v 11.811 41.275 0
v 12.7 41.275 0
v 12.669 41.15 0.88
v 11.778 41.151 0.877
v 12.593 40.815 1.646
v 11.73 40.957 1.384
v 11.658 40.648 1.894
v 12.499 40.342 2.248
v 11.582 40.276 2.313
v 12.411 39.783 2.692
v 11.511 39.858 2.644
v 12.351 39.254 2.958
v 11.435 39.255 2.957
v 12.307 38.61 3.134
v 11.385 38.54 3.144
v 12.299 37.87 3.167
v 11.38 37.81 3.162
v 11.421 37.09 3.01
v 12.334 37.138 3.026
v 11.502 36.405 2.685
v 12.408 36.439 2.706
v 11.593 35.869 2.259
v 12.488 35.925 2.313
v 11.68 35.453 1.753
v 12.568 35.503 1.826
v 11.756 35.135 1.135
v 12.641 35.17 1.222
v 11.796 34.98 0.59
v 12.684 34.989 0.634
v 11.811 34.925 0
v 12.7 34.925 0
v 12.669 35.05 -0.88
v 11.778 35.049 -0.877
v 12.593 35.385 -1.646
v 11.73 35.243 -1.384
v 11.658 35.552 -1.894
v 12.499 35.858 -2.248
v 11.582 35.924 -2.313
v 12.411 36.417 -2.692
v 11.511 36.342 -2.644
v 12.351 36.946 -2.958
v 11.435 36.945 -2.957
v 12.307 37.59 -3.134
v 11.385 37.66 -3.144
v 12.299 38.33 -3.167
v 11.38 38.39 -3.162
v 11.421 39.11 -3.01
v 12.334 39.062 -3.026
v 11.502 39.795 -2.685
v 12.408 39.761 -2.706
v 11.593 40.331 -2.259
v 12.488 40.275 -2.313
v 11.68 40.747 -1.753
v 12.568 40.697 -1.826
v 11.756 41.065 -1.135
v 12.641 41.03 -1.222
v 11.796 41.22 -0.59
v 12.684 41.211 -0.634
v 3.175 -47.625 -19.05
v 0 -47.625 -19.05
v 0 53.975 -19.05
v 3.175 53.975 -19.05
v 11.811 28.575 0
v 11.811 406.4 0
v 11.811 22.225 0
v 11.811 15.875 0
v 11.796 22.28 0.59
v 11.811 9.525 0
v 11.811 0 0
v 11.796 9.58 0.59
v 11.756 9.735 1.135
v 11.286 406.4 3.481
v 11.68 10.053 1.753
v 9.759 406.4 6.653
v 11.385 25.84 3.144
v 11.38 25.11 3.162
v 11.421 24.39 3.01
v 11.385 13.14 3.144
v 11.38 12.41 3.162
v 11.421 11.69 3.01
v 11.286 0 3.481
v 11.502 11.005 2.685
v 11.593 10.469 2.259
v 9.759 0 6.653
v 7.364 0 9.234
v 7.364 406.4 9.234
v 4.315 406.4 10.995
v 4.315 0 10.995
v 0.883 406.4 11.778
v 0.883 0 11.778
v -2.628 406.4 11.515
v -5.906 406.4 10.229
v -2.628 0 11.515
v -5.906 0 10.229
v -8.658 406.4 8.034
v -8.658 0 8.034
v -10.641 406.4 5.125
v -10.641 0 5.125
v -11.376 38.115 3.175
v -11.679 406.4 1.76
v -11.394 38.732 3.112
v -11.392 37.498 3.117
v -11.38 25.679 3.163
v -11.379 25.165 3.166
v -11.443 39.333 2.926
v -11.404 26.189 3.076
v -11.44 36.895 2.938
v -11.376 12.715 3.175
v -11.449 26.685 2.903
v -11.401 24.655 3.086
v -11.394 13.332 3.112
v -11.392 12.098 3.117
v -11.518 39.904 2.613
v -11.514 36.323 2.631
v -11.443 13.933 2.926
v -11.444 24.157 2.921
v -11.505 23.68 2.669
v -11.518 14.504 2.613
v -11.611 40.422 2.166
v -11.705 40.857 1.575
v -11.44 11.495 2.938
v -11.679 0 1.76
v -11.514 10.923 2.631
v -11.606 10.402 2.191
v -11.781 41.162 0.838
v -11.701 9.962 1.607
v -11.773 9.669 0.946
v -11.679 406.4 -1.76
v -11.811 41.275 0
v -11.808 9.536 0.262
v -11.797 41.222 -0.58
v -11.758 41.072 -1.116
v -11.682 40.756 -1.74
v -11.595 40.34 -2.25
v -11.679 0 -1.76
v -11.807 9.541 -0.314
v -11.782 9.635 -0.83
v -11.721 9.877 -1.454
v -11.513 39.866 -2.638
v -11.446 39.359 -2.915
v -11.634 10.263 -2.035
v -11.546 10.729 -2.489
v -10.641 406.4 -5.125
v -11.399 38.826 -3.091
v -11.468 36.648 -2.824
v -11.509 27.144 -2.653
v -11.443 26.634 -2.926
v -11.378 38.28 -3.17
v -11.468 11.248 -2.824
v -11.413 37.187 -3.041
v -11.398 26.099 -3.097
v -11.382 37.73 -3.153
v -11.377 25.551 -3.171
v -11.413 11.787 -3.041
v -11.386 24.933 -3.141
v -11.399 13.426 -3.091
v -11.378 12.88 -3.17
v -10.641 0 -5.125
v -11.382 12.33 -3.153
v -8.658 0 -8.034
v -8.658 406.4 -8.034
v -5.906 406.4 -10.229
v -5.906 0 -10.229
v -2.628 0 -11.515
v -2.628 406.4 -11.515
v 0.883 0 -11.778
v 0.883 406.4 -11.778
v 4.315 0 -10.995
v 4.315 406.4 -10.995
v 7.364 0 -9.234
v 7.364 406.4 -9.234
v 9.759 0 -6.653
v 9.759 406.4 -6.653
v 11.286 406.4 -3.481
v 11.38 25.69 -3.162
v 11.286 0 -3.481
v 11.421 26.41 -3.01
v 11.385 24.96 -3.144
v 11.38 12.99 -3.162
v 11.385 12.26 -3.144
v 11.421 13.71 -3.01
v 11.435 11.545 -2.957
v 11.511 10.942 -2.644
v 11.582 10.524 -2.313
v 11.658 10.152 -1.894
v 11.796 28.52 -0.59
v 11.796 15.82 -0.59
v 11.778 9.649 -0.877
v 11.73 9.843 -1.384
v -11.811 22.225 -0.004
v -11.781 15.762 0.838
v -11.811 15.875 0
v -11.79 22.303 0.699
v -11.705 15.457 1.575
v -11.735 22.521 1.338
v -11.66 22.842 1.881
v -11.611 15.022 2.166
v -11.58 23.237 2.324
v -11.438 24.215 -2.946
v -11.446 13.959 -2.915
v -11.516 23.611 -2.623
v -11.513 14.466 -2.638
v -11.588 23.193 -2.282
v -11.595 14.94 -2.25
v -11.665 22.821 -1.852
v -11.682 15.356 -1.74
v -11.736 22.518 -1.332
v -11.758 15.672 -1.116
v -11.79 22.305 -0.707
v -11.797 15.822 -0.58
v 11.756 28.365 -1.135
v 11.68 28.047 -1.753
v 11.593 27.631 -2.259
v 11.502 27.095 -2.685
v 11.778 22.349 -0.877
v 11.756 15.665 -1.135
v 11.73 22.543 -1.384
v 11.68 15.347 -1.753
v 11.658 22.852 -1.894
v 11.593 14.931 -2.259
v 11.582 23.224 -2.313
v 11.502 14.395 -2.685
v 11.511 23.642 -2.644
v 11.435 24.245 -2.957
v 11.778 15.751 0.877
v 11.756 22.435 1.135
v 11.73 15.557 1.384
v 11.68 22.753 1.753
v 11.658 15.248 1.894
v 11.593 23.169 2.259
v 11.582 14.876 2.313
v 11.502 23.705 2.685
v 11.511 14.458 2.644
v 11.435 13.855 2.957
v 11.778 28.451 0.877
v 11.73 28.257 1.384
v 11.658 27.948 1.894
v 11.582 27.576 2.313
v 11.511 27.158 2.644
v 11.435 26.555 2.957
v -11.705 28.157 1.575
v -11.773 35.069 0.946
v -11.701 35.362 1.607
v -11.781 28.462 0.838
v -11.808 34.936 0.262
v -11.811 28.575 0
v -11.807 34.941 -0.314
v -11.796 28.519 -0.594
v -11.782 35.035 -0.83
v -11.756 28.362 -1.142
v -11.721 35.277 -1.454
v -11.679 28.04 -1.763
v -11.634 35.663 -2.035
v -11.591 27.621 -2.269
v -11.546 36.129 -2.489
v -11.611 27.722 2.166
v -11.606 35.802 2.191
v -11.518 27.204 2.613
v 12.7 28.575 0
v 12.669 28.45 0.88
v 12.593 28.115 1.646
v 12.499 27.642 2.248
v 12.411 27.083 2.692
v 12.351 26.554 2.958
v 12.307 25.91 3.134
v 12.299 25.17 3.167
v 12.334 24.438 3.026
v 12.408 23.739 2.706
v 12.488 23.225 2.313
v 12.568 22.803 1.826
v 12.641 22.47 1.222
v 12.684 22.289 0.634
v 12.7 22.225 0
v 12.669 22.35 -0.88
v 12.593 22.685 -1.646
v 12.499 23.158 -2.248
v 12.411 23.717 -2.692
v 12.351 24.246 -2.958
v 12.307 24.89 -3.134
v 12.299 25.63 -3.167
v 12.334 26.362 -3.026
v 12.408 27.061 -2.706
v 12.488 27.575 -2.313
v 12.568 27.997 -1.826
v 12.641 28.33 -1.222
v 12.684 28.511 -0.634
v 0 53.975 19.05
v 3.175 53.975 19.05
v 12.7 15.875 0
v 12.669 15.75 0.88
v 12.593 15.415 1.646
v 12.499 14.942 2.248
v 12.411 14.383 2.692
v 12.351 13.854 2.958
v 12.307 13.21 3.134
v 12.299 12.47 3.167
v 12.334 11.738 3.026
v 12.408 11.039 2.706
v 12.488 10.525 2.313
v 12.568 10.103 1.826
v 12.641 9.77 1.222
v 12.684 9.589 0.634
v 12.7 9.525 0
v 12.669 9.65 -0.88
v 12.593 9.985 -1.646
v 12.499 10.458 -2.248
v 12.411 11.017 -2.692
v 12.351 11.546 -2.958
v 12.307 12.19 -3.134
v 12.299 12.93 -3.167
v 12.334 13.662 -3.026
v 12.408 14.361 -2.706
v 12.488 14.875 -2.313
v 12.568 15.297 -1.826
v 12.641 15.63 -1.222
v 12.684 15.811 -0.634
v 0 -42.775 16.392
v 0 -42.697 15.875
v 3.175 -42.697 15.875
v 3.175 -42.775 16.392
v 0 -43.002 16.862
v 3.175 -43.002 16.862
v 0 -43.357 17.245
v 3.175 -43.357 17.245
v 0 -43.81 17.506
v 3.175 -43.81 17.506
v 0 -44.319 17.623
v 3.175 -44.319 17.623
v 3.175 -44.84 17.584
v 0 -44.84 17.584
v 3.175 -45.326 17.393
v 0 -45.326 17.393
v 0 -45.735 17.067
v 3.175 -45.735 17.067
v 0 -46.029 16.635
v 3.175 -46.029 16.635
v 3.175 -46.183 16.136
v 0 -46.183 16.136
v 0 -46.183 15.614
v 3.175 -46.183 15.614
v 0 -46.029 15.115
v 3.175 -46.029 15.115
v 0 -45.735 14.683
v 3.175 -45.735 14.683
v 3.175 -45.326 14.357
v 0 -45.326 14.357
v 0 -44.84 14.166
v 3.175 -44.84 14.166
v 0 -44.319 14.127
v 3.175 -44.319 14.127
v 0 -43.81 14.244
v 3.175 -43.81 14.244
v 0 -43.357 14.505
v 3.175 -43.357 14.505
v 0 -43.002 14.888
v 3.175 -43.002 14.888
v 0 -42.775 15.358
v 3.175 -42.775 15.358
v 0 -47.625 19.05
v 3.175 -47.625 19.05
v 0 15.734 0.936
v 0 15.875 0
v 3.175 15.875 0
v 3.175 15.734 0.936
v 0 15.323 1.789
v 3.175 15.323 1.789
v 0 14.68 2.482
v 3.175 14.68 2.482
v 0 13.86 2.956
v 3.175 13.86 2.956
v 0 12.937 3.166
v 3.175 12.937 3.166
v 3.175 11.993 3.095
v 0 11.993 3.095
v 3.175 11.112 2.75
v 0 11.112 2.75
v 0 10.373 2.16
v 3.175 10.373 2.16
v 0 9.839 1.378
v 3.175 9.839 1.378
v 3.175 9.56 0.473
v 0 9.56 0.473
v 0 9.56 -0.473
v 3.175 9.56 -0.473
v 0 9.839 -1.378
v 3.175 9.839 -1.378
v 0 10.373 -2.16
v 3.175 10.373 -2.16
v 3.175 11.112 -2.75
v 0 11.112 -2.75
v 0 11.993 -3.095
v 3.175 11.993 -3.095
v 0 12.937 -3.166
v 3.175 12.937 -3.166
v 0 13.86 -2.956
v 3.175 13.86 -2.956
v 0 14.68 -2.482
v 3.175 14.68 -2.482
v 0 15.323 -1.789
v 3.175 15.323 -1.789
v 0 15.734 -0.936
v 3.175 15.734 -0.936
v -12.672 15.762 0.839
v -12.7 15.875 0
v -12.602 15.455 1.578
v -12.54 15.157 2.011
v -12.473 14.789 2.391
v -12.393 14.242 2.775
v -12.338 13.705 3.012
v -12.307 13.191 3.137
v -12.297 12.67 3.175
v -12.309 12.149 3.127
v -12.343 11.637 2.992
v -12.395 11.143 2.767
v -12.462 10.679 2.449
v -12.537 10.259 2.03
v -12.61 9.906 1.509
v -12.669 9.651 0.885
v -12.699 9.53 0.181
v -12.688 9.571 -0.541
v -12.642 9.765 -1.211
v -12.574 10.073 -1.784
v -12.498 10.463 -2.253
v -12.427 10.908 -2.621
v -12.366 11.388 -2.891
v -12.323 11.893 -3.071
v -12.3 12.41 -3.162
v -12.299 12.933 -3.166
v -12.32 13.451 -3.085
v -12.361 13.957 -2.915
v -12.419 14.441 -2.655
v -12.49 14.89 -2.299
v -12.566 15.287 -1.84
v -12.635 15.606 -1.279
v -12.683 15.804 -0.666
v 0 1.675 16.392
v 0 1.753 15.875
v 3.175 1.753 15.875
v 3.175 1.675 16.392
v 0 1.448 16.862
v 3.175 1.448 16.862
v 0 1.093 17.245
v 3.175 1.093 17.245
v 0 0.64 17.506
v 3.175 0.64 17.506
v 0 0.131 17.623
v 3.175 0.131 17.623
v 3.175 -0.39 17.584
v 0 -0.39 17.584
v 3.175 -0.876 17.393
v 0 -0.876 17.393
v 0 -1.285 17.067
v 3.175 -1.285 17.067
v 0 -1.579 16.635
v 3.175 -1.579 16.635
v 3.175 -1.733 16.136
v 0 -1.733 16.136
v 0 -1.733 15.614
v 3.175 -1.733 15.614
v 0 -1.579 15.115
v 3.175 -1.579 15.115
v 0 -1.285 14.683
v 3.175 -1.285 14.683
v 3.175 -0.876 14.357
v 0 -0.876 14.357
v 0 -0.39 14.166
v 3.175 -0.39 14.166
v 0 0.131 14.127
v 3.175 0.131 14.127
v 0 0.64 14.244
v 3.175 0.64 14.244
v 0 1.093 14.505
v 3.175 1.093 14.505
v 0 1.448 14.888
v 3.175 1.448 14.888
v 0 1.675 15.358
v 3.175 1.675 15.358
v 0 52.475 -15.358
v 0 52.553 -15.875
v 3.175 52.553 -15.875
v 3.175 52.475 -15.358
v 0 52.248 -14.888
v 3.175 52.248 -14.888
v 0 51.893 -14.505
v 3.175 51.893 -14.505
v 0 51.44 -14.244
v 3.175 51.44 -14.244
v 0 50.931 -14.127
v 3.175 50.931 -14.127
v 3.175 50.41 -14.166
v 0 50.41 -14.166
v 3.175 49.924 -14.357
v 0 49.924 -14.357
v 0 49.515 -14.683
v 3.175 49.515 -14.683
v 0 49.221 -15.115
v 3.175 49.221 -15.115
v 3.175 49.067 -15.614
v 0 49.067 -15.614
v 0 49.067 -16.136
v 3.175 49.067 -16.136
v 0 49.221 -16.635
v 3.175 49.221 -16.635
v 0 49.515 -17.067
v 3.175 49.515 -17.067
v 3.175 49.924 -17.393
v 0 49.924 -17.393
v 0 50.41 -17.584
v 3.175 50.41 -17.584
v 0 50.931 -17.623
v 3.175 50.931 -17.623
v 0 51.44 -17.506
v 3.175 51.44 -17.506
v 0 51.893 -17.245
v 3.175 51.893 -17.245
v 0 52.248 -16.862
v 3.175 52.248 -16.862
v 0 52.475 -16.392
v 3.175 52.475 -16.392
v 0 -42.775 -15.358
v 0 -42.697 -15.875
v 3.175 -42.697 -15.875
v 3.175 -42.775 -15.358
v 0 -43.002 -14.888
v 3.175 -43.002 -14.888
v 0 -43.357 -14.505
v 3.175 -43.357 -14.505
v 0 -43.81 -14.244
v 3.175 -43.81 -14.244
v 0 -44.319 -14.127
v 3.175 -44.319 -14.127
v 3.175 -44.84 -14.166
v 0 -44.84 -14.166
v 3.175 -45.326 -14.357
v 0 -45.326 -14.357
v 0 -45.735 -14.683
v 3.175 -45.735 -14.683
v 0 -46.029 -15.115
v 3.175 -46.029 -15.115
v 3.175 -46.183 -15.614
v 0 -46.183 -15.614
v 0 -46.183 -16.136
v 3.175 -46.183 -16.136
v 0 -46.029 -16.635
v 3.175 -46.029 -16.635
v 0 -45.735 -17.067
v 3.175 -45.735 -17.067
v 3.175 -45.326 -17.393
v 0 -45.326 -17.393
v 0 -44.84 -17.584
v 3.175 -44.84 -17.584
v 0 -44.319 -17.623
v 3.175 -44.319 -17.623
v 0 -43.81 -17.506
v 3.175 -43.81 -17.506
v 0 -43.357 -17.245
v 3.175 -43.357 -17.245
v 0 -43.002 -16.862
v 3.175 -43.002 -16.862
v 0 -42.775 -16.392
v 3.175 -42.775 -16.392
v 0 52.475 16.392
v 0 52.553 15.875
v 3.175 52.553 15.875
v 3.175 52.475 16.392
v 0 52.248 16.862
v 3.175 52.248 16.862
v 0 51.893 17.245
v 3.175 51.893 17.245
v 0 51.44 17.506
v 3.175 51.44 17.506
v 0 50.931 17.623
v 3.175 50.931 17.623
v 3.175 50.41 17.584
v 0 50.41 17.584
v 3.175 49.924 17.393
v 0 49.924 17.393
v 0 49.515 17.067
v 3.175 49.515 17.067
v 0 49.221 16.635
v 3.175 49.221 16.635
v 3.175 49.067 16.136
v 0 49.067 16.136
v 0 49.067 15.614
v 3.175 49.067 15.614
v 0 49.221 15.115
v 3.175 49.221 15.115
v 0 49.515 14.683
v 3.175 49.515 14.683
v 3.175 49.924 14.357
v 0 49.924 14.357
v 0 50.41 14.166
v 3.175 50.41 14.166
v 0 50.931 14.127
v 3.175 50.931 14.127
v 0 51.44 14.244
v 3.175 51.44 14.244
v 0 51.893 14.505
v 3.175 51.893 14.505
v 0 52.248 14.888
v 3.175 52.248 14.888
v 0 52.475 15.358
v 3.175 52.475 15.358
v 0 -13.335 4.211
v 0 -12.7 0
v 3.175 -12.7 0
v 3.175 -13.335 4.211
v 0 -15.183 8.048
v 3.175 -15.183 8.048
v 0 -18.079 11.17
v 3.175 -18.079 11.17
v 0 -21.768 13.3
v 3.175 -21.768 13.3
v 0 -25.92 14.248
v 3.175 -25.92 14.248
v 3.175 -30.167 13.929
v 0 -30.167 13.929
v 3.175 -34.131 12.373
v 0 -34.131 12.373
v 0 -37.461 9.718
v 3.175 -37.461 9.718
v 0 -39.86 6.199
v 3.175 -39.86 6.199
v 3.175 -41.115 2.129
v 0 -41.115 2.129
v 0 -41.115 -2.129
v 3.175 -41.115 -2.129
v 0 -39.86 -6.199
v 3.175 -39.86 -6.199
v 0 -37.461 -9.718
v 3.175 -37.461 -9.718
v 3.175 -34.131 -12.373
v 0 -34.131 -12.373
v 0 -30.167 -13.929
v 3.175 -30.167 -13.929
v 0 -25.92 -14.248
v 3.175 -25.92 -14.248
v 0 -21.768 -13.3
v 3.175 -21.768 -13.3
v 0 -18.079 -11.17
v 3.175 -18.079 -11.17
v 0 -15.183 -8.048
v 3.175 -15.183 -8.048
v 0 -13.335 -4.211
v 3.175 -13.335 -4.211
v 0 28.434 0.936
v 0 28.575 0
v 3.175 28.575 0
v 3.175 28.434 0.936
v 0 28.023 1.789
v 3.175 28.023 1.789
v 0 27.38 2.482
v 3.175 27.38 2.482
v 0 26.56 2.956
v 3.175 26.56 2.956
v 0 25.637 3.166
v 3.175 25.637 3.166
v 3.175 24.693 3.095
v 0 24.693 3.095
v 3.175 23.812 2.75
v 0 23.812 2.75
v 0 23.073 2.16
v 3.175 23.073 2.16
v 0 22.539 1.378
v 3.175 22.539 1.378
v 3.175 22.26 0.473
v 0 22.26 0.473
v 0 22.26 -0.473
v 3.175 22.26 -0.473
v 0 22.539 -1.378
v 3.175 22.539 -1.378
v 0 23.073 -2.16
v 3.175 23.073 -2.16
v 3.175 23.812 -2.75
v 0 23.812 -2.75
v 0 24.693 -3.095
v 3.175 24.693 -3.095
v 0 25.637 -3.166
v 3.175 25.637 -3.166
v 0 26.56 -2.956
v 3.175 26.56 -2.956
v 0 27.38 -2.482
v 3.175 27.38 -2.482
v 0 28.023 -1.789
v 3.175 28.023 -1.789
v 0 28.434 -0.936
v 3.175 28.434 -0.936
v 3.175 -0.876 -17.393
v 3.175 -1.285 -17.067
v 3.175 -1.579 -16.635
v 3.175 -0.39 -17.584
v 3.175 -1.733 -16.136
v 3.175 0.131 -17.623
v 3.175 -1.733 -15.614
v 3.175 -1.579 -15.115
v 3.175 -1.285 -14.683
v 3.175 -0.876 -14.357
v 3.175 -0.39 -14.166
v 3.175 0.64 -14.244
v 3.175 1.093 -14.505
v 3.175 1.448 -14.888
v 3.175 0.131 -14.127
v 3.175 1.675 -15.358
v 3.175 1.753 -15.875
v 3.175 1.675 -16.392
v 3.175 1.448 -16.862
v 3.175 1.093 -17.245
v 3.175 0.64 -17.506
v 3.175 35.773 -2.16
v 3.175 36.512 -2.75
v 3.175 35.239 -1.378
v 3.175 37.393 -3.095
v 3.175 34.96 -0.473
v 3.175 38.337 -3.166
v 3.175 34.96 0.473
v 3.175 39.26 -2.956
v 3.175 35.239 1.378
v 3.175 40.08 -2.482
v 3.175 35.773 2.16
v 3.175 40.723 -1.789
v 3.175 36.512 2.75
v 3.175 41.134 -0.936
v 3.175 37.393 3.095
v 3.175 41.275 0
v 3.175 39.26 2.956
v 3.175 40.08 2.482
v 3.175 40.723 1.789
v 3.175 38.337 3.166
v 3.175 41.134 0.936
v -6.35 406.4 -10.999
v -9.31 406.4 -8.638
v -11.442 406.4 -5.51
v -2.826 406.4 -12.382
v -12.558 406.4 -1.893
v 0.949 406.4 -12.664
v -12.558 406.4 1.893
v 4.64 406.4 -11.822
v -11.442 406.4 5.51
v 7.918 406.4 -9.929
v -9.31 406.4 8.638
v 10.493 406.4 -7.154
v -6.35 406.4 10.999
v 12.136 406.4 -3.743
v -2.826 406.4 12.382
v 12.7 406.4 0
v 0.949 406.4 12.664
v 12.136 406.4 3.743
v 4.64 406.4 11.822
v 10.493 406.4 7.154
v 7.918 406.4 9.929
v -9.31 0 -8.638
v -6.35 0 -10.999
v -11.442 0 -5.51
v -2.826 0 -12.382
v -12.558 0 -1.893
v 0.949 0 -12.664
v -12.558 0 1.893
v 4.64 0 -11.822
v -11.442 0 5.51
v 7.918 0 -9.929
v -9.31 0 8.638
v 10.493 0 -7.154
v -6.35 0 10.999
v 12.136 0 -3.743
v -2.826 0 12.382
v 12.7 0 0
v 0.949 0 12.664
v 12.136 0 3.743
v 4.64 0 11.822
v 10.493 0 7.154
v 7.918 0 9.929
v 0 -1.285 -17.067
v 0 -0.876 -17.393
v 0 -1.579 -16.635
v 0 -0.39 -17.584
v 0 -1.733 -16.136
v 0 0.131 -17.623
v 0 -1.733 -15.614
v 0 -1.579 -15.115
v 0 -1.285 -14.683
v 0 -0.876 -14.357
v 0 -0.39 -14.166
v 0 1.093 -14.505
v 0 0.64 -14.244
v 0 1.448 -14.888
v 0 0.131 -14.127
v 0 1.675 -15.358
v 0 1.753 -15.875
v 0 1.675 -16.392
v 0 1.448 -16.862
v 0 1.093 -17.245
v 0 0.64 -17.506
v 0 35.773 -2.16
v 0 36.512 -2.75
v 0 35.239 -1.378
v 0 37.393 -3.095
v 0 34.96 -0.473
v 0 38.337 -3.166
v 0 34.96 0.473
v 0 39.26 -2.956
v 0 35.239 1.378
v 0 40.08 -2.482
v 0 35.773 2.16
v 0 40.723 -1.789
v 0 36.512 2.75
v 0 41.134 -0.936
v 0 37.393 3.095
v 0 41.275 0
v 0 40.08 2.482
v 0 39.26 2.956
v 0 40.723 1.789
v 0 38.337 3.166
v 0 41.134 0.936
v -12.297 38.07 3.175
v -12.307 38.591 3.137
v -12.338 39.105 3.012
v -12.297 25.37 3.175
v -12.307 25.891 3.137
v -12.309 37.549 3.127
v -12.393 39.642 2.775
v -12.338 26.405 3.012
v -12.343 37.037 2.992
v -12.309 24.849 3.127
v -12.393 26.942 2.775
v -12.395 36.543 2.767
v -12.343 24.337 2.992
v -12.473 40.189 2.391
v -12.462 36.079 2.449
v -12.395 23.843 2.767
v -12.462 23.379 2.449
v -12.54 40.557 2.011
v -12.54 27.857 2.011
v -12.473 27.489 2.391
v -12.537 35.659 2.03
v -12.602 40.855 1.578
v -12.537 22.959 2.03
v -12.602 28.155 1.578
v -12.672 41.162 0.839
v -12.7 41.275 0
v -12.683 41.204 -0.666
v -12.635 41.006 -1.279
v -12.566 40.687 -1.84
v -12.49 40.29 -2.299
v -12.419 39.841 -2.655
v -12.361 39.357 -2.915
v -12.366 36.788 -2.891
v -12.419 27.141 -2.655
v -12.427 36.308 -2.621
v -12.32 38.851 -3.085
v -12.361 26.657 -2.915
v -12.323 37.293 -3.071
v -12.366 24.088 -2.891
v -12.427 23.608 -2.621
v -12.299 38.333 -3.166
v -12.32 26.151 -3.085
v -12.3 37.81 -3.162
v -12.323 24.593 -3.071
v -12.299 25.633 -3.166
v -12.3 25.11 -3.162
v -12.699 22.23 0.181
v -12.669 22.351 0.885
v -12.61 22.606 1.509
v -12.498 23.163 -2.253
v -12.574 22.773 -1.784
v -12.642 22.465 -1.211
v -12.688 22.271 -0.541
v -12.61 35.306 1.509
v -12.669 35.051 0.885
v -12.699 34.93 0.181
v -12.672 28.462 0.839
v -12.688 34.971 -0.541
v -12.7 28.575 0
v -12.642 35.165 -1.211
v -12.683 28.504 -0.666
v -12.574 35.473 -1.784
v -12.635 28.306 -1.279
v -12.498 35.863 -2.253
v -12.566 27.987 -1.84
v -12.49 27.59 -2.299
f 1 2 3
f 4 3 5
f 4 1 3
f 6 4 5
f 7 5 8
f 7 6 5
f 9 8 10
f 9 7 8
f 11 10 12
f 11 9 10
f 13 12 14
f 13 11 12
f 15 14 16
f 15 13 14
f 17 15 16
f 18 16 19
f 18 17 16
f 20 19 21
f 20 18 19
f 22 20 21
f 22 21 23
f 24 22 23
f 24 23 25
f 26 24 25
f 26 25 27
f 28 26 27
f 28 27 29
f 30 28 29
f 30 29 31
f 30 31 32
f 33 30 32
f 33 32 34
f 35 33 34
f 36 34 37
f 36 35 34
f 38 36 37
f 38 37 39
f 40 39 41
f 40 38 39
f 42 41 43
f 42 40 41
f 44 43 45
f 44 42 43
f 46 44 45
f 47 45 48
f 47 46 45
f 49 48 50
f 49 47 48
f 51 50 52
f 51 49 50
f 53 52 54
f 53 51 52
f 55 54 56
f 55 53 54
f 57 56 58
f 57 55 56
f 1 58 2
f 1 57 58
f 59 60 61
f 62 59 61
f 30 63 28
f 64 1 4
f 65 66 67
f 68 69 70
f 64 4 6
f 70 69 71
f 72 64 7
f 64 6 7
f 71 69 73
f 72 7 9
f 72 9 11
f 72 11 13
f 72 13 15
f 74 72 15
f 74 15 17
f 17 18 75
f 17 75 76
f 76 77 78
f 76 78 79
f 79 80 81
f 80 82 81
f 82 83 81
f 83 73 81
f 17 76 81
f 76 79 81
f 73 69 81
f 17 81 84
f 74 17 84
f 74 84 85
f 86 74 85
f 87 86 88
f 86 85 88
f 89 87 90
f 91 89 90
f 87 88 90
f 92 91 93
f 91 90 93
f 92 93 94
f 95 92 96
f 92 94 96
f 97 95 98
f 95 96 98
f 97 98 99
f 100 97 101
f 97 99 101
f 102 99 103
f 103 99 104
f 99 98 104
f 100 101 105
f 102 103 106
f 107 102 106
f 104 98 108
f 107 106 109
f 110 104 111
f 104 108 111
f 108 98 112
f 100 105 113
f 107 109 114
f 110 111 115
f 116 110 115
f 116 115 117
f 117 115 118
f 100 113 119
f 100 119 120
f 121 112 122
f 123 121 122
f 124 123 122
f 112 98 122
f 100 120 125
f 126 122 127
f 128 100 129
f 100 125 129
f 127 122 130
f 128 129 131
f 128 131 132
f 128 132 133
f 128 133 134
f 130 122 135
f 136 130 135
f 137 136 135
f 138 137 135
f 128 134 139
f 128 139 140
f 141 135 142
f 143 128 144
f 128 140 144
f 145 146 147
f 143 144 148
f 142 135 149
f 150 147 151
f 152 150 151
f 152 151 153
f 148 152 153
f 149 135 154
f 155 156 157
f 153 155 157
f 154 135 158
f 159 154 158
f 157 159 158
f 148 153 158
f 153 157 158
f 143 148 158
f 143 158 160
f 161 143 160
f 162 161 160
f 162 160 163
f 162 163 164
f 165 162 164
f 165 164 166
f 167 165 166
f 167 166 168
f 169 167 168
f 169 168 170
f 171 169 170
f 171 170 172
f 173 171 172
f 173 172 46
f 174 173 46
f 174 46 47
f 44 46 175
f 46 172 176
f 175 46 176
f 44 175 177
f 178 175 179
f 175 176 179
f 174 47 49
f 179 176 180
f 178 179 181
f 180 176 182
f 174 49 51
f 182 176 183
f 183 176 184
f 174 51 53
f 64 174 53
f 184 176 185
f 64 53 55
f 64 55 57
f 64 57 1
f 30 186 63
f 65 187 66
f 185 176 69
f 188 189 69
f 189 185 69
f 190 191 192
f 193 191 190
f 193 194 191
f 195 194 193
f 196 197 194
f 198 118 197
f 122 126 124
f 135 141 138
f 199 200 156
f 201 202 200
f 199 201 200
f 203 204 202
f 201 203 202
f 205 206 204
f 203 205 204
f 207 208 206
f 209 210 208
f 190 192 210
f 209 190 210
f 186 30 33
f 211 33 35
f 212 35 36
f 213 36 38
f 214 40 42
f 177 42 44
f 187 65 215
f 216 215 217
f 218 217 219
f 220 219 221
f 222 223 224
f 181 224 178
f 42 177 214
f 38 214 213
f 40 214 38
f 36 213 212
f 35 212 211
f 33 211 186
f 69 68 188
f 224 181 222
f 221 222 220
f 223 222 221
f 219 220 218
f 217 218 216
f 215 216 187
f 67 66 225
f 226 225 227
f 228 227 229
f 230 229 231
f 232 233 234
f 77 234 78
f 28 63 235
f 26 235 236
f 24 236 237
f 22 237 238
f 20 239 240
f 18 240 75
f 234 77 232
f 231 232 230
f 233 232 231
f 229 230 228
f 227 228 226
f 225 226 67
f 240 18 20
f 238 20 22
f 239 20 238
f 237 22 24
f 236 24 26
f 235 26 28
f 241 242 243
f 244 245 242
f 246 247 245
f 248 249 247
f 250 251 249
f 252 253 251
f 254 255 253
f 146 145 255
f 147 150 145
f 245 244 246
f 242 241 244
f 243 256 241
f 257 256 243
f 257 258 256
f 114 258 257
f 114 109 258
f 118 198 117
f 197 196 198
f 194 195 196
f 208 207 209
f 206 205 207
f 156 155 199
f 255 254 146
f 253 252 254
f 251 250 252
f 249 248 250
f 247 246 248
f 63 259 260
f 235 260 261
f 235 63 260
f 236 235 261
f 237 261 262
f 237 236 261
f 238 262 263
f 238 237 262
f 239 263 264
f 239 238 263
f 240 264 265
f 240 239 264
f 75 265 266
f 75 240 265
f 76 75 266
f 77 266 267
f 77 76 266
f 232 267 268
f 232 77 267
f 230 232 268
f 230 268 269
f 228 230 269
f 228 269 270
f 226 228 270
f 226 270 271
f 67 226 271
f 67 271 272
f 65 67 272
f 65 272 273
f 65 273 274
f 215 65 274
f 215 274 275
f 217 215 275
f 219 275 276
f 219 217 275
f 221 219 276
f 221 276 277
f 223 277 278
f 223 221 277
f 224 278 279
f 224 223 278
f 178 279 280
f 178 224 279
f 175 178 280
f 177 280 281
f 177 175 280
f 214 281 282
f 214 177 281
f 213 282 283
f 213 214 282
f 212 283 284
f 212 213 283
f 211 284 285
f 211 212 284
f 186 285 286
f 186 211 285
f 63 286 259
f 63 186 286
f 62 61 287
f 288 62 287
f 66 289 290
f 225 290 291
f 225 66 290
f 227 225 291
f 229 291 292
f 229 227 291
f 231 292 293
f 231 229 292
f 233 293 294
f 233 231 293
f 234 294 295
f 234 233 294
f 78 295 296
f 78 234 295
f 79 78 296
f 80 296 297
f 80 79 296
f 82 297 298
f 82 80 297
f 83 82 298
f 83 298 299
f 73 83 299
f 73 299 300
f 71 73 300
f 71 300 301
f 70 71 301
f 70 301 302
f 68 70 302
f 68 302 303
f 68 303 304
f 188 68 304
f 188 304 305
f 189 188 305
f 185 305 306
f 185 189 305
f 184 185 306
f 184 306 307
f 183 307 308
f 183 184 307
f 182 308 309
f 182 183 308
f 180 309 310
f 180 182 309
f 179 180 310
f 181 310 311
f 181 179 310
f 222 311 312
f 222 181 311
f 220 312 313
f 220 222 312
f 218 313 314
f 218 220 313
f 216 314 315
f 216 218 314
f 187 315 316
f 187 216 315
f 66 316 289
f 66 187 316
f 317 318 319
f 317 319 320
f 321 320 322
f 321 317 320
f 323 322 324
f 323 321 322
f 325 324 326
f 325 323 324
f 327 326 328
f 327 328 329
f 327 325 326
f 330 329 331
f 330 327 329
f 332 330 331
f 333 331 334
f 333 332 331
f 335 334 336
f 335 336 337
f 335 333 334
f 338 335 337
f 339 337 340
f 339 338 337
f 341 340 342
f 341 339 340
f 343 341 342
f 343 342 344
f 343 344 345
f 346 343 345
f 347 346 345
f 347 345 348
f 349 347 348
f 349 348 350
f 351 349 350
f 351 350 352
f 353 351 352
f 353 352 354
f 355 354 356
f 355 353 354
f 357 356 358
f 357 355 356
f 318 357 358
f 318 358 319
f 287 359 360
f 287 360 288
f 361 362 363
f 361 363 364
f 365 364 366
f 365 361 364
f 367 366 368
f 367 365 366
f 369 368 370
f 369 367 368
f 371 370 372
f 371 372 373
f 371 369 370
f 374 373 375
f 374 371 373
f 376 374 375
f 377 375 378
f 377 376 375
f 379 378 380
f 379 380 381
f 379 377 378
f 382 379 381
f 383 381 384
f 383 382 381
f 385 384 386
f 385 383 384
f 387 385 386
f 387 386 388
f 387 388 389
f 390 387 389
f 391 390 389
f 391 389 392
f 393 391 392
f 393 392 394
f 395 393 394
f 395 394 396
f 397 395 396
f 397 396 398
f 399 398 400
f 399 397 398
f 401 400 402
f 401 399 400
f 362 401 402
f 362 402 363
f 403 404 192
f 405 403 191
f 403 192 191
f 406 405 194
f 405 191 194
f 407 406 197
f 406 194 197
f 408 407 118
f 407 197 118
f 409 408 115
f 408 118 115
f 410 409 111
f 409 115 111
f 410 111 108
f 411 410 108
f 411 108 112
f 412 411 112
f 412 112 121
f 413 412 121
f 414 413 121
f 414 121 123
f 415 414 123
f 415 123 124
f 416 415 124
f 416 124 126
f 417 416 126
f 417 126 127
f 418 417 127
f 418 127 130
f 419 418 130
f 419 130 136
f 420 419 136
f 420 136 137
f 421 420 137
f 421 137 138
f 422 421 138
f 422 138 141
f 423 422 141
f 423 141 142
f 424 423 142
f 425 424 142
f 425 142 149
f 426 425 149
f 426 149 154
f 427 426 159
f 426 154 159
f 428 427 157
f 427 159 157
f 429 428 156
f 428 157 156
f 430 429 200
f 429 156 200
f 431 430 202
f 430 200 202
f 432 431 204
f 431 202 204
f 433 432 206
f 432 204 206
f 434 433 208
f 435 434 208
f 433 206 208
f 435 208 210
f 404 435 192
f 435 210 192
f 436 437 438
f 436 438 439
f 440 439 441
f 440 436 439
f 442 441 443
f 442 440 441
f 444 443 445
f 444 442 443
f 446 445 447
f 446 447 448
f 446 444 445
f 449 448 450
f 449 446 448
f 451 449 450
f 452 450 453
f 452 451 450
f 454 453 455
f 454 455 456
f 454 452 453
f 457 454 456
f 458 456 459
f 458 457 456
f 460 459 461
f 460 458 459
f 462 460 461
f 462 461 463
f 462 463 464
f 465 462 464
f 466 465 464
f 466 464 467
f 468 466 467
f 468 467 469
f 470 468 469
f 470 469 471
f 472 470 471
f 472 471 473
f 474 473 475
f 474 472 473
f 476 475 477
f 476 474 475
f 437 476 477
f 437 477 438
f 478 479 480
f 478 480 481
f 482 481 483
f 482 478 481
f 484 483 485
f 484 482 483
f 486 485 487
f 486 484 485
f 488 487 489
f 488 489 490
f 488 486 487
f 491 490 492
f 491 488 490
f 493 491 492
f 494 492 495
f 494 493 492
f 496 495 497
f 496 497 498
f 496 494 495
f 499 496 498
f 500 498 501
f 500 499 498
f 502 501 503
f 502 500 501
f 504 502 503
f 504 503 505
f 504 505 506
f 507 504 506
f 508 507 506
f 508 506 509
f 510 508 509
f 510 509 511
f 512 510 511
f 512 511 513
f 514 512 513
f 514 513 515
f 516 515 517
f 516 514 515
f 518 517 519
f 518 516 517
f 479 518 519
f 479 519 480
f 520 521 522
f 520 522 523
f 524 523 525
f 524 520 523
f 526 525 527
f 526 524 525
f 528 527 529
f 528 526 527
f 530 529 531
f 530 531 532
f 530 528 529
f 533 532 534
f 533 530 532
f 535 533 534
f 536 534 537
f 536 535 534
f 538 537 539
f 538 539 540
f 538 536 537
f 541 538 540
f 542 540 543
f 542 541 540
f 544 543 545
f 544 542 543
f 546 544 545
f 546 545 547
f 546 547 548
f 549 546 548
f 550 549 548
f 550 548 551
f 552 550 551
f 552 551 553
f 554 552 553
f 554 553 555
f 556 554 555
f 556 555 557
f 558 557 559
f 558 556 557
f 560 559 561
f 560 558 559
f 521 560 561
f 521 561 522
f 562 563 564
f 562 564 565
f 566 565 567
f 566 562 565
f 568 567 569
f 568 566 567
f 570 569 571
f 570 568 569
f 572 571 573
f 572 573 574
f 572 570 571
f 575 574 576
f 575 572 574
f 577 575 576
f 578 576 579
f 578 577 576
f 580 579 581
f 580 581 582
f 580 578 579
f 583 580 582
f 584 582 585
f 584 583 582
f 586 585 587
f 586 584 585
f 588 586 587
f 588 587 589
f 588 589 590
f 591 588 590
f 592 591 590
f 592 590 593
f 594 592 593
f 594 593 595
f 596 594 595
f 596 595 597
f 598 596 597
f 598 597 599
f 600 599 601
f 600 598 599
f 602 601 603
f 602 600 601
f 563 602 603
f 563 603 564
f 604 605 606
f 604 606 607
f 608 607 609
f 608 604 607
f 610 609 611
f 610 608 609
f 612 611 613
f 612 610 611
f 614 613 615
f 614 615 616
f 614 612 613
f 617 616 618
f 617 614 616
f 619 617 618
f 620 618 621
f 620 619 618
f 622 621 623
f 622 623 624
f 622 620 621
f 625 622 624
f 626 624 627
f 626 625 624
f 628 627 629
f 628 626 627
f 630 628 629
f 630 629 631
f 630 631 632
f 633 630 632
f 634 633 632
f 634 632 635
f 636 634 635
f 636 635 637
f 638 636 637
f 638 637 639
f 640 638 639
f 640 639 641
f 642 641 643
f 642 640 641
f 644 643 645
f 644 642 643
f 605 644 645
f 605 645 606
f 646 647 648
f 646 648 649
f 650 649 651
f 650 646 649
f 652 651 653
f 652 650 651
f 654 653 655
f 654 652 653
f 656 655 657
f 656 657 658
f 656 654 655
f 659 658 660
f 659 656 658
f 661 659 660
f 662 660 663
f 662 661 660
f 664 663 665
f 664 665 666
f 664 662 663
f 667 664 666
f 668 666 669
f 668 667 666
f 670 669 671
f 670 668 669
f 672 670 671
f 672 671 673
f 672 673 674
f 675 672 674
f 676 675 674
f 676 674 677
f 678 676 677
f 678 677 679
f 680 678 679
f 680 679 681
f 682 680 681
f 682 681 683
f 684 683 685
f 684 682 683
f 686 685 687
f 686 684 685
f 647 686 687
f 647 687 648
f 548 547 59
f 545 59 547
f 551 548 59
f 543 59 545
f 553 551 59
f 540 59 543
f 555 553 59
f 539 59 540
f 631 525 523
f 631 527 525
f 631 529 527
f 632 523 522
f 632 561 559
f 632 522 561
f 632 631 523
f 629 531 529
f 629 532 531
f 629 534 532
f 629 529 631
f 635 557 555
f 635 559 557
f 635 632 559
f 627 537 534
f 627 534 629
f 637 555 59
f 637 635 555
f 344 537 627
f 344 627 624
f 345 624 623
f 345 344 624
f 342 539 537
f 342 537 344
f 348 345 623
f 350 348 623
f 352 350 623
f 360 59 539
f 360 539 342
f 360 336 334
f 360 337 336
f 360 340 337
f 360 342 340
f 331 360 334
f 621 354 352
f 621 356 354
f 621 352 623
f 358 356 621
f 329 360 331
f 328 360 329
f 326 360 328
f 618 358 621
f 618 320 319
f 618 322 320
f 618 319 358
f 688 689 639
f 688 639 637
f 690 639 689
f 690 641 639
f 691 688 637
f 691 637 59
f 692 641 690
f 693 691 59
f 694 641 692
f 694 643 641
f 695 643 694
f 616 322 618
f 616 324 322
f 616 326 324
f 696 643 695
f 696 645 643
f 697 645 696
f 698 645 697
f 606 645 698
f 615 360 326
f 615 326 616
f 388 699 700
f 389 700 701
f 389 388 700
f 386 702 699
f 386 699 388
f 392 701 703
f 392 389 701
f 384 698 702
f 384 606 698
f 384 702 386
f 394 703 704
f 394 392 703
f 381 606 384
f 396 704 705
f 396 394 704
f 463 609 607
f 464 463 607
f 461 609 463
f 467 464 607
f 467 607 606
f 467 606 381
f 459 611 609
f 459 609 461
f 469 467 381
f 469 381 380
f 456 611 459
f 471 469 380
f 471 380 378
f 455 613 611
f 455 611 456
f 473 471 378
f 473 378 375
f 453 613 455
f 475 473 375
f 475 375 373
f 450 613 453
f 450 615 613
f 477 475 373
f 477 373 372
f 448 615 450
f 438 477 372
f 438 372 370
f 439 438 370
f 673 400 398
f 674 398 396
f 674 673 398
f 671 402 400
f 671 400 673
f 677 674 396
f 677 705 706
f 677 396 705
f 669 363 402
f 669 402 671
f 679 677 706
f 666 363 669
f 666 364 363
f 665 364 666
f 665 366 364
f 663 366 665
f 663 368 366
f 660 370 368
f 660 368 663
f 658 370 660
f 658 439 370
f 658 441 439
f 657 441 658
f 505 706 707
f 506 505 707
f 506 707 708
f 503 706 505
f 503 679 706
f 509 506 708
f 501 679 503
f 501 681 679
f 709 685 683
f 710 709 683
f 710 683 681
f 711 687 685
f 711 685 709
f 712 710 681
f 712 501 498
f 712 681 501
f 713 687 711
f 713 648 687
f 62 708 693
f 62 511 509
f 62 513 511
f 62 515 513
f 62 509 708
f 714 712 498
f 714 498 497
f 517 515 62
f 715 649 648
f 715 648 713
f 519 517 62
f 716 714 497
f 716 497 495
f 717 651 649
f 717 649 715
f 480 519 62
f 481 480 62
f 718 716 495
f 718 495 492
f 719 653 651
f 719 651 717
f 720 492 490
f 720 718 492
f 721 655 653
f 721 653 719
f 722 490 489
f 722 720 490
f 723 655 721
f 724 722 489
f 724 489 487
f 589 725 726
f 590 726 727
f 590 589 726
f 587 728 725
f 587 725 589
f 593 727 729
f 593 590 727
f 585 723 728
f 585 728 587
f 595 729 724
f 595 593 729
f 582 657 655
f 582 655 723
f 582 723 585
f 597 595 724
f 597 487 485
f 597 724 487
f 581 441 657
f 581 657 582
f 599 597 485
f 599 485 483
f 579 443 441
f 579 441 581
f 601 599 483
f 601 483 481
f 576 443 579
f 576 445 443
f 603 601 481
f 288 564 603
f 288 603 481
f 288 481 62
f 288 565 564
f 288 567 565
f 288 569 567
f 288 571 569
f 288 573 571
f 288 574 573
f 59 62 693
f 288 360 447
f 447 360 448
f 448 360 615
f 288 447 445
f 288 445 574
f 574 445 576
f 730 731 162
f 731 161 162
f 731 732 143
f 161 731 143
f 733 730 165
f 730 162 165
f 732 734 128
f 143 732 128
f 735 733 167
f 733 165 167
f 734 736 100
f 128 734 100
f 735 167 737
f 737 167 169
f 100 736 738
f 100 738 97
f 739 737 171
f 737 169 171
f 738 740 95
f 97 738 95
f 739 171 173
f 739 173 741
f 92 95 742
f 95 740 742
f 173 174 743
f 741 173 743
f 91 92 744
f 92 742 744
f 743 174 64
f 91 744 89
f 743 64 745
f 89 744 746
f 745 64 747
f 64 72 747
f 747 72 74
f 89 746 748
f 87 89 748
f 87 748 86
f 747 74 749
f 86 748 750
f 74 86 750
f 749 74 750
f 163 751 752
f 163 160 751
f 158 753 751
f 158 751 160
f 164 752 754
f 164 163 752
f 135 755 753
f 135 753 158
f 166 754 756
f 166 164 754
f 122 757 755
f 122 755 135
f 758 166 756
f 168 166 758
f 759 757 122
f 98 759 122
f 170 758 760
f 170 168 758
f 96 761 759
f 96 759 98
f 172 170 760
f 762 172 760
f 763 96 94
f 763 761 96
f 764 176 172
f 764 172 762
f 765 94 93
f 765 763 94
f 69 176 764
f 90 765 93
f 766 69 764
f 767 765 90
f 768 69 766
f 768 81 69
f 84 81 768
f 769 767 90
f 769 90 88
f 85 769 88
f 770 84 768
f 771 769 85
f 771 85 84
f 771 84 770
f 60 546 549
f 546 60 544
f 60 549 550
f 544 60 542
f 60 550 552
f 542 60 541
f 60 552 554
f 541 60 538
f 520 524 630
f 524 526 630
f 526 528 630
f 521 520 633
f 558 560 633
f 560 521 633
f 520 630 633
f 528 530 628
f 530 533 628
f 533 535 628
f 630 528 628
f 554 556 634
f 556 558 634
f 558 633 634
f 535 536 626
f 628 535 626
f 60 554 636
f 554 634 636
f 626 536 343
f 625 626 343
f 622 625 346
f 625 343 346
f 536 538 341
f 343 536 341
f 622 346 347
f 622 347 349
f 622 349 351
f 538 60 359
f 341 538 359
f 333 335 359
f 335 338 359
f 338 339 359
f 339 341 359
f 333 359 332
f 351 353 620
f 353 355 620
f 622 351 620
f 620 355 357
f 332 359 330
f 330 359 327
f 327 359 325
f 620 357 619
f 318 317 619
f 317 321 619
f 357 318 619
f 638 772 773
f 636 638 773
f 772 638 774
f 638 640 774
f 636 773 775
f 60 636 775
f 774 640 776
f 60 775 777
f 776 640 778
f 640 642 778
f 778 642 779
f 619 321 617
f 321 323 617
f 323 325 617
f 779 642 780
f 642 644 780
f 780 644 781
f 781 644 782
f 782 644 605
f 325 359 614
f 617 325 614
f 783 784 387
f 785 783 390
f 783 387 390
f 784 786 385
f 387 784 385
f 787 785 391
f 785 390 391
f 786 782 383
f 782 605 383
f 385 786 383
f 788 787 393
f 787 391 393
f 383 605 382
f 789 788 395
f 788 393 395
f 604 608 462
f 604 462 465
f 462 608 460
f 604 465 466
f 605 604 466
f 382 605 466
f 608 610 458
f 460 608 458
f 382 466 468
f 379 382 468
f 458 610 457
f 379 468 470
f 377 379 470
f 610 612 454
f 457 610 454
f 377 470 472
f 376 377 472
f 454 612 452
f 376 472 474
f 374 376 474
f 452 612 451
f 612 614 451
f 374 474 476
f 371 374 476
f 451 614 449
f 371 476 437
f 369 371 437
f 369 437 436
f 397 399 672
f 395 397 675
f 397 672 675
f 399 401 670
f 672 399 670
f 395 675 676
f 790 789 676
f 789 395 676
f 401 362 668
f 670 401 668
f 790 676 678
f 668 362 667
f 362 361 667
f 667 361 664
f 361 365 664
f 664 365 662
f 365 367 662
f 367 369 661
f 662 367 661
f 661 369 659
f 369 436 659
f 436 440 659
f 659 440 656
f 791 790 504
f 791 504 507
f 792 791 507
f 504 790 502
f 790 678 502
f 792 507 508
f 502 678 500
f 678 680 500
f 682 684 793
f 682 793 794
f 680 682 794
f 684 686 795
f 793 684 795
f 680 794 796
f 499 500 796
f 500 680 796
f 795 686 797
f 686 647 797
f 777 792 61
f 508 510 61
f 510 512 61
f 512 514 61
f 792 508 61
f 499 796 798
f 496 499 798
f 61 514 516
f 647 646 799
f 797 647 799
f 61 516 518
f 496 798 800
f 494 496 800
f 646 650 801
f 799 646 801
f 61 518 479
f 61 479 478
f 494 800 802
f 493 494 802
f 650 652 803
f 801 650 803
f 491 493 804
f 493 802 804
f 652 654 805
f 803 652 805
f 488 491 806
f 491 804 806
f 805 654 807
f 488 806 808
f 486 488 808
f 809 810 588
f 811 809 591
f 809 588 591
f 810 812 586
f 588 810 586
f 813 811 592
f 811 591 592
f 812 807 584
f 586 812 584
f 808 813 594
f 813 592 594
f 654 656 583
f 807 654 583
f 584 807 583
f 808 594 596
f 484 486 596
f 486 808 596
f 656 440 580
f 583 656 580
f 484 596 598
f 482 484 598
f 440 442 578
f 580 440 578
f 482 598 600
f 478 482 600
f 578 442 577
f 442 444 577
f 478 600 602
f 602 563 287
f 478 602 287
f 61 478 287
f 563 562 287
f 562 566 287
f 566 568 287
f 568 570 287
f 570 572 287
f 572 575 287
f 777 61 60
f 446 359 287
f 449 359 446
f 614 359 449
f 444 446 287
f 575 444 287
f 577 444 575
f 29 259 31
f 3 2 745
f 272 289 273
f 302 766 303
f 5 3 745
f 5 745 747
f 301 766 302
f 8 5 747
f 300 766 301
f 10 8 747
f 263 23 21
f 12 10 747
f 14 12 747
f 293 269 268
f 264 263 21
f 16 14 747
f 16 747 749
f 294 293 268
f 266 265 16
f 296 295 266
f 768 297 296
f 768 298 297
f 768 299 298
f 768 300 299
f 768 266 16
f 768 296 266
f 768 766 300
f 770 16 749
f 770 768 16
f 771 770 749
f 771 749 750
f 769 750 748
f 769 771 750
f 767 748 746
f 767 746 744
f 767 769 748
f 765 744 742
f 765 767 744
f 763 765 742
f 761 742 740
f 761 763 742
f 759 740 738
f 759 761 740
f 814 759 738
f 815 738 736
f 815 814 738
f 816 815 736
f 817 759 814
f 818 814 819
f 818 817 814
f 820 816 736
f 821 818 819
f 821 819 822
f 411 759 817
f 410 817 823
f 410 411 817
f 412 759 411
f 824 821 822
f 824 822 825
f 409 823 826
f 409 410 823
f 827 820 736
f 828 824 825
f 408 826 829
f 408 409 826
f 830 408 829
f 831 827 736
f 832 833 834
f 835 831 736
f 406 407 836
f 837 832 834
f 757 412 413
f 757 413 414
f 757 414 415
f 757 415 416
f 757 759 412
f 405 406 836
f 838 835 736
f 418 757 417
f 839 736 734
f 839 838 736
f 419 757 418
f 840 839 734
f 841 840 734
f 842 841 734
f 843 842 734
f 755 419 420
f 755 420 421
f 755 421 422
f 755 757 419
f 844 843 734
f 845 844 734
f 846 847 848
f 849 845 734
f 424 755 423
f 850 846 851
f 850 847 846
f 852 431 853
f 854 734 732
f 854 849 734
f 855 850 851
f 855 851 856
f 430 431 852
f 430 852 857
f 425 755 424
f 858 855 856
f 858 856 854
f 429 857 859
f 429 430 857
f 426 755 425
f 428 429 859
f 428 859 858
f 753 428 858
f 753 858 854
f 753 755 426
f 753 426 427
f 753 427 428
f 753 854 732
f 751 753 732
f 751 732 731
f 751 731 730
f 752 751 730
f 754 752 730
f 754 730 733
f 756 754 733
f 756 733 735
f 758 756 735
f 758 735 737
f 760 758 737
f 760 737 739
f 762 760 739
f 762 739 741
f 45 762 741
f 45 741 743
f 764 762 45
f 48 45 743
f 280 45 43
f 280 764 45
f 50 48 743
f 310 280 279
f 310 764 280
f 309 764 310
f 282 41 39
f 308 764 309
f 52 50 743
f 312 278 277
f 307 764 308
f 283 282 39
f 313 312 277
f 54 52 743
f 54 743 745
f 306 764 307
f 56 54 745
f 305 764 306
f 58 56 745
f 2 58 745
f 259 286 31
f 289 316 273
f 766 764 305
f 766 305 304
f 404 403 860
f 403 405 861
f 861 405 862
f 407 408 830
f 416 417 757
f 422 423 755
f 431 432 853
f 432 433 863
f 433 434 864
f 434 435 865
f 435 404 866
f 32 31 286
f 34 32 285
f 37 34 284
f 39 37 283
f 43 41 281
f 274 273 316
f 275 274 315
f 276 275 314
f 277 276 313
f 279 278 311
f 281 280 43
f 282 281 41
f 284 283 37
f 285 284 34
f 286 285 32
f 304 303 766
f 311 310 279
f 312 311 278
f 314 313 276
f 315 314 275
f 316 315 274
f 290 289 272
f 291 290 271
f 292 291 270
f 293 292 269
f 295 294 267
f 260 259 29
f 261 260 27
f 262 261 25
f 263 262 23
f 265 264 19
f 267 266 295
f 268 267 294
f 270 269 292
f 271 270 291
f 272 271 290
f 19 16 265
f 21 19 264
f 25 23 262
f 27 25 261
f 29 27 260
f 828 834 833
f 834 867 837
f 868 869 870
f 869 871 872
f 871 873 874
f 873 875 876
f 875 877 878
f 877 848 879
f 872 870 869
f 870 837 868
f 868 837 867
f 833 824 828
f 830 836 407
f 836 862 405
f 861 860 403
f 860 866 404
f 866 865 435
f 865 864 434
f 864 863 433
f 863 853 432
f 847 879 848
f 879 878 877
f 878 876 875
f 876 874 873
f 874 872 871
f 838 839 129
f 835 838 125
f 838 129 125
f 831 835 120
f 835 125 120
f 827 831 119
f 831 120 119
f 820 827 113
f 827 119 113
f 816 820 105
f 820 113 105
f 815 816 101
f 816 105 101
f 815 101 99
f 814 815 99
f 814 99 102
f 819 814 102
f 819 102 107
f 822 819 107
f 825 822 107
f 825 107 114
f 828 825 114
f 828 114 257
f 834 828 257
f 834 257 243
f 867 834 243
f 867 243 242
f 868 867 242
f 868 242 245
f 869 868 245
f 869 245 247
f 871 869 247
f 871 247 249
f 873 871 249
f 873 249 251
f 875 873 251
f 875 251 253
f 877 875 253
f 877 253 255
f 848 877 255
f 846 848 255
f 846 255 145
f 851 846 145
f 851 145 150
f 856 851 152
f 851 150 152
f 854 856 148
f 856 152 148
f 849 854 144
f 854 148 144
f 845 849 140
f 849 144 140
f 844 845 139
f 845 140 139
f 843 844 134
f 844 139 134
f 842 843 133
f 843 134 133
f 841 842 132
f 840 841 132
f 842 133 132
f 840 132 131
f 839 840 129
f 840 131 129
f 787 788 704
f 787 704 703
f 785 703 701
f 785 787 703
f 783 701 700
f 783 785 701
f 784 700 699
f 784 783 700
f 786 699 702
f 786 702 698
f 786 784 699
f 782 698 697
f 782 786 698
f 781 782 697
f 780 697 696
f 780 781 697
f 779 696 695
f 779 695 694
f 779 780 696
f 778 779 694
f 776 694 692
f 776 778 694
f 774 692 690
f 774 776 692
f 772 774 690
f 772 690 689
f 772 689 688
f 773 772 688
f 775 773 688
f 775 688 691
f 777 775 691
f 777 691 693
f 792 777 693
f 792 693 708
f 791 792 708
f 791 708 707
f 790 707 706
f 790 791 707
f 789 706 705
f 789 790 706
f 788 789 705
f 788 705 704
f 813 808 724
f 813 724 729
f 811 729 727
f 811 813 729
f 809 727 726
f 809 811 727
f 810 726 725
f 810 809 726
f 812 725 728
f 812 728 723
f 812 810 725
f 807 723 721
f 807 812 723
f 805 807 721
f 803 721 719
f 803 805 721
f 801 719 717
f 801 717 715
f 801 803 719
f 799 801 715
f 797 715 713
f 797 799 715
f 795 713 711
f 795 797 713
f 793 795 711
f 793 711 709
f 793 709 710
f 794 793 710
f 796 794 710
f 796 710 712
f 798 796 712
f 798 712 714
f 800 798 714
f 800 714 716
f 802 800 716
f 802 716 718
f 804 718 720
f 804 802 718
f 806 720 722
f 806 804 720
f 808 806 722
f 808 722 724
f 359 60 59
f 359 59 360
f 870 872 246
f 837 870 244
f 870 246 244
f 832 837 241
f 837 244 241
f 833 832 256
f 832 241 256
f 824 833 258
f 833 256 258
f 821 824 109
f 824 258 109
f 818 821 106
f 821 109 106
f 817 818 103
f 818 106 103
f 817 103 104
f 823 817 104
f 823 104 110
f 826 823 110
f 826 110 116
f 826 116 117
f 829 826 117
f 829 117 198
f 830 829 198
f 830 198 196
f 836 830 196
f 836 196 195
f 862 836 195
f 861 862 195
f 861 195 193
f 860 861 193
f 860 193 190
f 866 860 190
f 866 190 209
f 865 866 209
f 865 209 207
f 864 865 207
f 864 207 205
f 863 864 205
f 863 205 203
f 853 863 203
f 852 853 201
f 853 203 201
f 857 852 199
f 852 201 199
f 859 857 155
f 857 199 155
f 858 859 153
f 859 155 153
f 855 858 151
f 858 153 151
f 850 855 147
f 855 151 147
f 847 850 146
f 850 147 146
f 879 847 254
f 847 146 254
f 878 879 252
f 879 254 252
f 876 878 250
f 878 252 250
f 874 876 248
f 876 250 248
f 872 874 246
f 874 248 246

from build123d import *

# Parameters (mm, degrees)
F0_R          = 12.7
F0_R_2        = 11.811
F1_DEPTH      = 406.4
F2_R          = 3.175
F3_DEPTH      = 12.701
F3_DEPTH_BACK = 25.4
F4_W          = 101.6
F4_H          = 38.1
F4_R          = 1.7526
F4_R_2        = 14.2875
F4_R_3        = 3.175
F5_DEPTH      = 3.175


with BuildPart() as f1:
    # F0 (on Front) → F1 (new body)
    with BuildSketch(Plane.XZ):
        Circle(F0_R)
        Circle(F0_R_2, mode=Mode.SUBTRACT)
    extrude(amount=-F1_DEPTH)

    # F2 (on Right) → F3 (cut, two sides)
    with BuildSketch(Plane.YZ) as f3_sk:
        with Locations((12.7, 0)):
            Circle(F2_R)
        with Locations((25.4, 0)):
            Circle(F2_R)
        with Locations((38.1, 0)):
            Circle(F2_R)
    extrude(amount=F3_DEPTH, mode=Mode.SUBTRACT)
    extrude(f3_sk.sketch, amount=-F3_DEPTH_BACK, mode=Mode.SUBTRACT)


with BuildPart() as f5:
    # F4 (on Right) → F5 (new body)
    with BuildSketch(Plane.YZ):
        with Locations((3.175, 0)):
            Rectangle(F4_W, F4_H)
        with Locations((-44.45, -15.875)):
            Circle(F4_R, mode=Mode.SUBTRACT)
        with Locations((0, -15.875)):
            Circle(F4_R, mode=Mode.SUBTRACT)
        with Locations((50.8, -15.875)):
            Circle(F4_R, mode=Mode.SUBTRACT)
        with Locations((-26.9875, 0)):
            Circle(F4_R_2, mode=Mode.SUBTRACT)
        with Locations((-44.45, 15.875)):
            Circle(F4_R, mode=Mode.SUBTRACT)
        with Locations((0, 15.875)):
            Circle(F4_R, mode=Mode.SUBTRACT)
        with Locations((12.7, 0)):
            Circle(F4_R_3, mode=Mode.SUBTRACT)
        with Locations((25.4, 0)):
            Circle(F4_R_3, mode=Mode.SUBTRACT)
        with Locations((38.1, 0)):
            Circle(F4_R_3, mode=Mode.SUBTRACT)
        with Locations((50.8, 15.875)):
            Circle(F4_R, mode=Mode.SUBTRACT)
    extrude(amount=F5_DEPTH)


solid = Compound([f1.part, f5.part])
